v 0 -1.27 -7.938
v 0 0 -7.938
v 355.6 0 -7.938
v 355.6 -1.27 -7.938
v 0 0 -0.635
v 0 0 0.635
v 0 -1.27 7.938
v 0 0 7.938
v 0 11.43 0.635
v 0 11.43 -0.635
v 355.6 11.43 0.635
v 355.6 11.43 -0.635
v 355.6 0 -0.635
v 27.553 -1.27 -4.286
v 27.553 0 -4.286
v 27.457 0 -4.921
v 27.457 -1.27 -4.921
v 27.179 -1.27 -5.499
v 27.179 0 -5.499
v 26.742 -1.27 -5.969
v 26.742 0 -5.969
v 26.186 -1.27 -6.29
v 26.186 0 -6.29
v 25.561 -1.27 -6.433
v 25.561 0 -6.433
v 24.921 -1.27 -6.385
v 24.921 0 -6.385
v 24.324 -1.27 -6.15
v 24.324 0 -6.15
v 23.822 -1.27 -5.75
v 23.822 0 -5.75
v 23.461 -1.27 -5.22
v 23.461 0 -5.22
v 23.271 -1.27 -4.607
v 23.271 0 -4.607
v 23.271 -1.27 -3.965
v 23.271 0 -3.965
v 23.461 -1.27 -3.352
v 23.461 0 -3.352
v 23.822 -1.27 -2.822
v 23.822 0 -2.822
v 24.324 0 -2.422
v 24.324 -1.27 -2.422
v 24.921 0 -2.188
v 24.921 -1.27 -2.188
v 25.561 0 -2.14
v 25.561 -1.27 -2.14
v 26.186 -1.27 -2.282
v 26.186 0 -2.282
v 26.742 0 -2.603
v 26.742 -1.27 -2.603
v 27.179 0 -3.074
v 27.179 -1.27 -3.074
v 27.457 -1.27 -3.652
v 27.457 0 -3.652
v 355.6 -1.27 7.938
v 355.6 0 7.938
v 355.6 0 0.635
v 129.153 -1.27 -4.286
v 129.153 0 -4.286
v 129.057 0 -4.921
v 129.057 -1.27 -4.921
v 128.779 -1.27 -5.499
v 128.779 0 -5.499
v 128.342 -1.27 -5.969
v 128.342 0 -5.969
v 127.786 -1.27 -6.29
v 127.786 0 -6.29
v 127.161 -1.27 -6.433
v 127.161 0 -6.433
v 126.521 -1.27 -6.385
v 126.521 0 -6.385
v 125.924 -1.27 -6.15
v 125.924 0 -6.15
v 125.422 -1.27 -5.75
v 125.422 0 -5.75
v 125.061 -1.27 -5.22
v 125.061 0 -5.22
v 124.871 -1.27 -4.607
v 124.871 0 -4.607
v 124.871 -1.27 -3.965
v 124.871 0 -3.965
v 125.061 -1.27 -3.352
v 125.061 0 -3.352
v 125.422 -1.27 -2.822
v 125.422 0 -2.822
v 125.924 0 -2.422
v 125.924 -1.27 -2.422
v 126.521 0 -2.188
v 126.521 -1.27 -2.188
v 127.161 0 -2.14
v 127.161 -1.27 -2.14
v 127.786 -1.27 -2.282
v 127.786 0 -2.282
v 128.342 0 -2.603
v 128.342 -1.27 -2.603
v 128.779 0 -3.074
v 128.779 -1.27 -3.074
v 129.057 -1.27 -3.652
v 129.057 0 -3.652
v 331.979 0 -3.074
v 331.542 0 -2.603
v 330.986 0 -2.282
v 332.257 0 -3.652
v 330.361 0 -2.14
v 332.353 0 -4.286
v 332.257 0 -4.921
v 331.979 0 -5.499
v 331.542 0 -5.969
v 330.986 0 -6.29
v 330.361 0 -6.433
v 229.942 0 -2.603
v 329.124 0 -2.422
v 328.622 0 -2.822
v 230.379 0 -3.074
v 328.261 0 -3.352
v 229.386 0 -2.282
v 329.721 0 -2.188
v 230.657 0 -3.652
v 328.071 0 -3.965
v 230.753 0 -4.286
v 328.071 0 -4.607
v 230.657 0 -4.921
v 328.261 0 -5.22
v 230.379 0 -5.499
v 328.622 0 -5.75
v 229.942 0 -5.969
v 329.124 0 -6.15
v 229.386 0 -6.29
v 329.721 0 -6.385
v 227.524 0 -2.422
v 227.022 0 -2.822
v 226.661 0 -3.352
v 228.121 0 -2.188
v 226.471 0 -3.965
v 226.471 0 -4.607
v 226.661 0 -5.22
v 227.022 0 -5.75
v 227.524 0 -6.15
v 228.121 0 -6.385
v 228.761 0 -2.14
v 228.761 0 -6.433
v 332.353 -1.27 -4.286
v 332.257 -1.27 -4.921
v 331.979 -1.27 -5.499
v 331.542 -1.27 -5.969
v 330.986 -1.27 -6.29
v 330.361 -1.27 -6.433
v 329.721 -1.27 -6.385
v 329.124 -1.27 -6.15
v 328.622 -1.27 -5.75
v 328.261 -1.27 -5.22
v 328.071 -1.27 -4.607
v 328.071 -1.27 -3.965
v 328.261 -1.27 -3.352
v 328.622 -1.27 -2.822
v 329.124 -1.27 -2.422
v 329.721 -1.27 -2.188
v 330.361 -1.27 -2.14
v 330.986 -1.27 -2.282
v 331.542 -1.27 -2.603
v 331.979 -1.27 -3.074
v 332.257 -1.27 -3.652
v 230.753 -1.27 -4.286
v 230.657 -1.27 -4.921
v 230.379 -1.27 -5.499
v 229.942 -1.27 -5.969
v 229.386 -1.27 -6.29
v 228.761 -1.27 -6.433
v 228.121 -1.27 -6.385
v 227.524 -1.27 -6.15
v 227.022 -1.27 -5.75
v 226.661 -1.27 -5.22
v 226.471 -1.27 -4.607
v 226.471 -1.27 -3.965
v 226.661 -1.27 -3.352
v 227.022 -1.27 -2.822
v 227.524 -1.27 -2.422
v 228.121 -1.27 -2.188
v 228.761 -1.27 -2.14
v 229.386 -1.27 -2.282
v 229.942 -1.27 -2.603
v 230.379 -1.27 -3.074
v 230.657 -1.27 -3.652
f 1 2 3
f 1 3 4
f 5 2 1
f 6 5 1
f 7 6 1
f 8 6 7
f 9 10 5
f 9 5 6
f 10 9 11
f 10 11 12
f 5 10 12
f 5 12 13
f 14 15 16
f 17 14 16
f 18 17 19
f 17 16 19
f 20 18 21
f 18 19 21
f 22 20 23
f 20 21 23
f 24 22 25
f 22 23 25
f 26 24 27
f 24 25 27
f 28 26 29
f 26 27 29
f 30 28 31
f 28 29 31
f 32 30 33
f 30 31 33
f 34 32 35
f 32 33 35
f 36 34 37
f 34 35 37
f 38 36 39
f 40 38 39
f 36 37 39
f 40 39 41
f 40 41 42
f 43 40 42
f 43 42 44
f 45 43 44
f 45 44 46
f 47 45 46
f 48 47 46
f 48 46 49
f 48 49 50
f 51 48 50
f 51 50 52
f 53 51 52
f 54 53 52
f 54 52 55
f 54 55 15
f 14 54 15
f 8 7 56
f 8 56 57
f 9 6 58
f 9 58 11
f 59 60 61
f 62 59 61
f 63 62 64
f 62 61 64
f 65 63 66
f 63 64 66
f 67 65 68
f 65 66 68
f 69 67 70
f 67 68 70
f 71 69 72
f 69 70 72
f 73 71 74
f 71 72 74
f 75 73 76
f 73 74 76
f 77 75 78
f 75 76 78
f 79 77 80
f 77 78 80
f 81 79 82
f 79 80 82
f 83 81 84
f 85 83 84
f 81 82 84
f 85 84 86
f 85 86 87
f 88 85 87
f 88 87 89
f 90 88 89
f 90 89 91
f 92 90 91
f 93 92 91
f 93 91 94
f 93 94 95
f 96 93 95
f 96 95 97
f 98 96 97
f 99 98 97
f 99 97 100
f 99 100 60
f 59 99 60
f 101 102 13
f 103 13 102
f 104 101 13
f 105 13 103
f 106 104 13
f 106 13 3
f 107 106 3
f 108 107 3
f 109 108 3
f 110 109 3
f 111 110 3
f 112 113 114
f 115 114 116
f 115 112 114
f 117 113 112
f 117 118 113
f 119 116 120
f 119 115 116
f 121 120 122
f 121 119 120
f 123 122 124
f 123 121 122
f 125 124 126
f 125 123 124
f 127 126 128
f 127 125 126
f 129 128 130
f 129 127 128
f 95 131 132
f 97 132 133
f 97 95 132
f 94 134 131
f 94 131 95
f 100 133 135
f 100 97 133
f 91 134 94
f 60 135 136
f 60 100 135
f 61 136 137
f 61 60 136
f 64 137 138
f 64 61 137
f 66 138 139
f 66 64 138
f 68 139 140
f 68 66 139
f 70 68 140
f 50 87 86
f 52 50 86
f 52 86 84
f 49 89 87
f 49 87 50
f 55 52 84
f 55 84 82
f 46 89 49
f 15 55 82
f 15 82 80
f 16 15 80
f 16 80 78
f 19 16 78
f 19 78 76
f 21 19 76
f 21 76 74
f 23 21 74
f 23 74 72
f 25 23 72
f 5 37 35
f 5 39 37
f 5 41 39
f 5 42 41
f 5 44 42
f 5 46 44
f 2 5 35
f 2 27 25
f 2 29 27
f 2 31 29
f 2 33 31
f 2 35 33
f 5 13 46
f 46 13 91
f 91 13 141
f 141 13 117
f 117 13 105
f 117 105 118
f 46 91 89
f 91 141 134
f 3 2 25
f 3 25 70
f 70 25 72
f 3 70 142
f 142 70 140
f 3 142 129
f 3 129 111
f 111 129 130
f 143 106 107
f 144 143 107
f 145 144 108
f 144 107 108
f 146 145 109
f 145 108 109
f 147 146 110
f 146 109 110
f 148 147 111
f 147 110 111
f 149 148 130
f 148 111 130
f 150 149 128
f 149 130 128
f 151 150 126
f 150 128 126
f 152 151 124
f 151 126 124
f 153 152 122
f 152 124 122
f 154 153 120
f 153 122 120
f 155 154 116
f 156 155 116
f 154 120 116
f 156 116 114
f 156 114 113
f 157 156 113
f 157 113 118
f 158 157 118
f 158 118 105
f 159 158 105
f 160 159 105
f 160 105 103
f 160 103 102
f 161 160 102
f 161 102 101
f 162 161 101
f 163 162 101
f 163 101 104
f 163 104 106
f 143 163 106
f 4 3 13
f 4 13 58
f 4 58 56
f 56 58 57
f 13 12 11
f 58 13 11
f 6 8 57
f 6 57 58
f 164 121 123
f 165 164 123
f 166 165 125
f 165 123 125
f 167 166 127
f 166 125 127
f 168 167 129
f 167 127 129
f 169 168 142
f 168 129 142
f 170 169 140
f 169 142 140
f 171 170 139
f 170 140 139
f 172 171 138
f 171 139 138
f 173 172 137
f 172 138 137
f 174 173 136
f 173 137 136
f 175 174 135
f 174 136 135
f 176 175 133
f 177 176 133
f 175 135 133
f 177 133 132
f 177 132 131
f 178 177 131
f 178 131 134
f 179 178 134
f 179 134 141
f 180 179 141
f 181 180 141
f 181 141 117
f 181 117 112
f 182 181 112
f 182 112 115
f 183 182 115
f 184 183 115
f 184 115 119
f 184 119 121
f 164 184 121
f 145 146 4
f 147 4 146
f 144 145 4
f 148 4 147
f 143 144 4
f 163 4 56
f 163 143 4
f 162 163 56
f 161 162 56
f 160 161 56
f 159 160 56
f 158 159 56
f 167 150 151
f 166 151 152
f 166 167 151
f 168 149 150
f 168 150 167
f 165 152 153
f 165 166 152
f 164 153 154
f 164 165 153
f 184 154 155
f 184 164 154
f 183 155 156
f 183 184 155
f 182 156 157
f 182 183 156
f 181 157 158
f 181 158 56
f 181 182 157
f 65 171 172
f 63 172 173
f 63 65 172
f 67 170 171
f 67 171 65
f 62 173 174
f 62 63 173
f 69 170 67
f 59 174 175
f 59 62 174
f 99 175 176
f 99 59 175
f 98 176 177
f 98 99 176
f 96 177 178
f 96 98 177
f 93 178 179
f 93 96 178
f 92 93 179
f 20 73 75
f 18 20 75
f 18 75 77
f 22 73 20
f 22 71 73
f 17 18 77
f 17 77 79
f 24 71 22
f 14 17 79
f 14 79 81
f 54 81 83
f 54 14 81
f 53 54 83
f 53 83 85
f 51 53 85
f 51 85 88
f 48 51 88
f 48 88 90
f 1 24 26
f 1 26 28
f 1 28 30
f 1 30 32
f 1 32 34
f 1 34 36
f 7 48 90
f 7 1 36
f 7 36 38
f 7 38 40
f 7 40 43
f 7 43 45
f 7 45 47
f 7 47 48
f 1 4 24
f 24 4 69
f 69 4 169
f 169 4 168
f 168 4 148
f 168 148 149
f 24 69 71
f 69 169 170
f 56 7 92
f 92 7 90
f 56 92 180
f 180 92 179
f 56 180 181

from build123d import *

# Parameters (mm, degrees)
BOSS_EXTRUDE1_DEPTH = 355.6
CUT_EXTRUDE1_REACH  = 3.27
SKETCH2_R           = 2.15265


with BuildPart() as part:
    # Sketch1 → Boss-Extrude1 (new body)
    with BuildSketch(Plane(origin=(0, 0, 0), x_dir=(0, 0, -1), z_dir=(1, 0, 0))):
        Polygon((0.635, 0), (7.9375, 0), (7.9375, -1.27), (-7.9375, -1.27), (-7.9375, 0), (-0.635, 0), (-0.635, 11.43), (0.635, 11.43), align=None)
    extrude(amount=BOSS_EXTRUDE1_DEPTH)

    # Sketch2 → Cut-Extrude1 (cut, up to next)
    with BuildSketch(Plane(origin=(0, 0, 0), x_dir=(1, 0, 0), z_dir=(0, 1, 0)), mode=Mode.PRIVATE) as cut_extrude1_sk1:
        with Locations((25.4, 4.28625)):
            Circle(SKETCH2_R)
    cut_extrude1_tool1 = extrude(cut_extrude1_sk1.sketch, amount=-CUT_EXTRUDE1_REACH, mode=Mode.PRIVATE) & part.part
    add(cut_extrude1_tool1.solids().sort_by_distance((25.4, 0, -4.28625))[0], mode=Mode.SUBTRACT)
    # Sketch2 → Cut-Extrude1 (cut, up to next)
    with BuildSketch(Plane(origin=(0, 0, 0), x_dir=(1, 0, 0), z_dir=(0, 1, 0)), mode=Mode.PRIVATE) as cut_extrude1_sk2:
        with Locations((127, 4.28625)):
            Circle(SKETCH2_R)
    cut_extrude1_tool2 = extrude(cut_extrude1_sk2.sketch, amount=-CUT_EXTRUDE1_REACH, mode=Mode.PRIVATE) & part.part
    add(cut_extrude1_tool2.solids().sort_by_distance((127, 0, -4.28625))[0], mode=Mode.SUBTRACT)
    # Sketch2 → Cut-Extrude1 (cut, up to next)
    with BuildSketch(Plane(origin=(0, 0, 0), x_dir=(1, 0, 0), z_dir=(0, 1, 0)), mode=Mode.PRIVATE) as cut_extrude1_sk3:
        with Locations((228.6, 4.28625)):
            Circle(SKETCH2_R)
    cut_extrude1_tool3 = extrude(cut_extrude1_sk3.sketch, amount=-CUT_EXTRUDE1_REACH, mode=Mode.PRIVATE) & part.part
    add(cut_extrude1_tool3.solids().sort_by_distance((228.6, 0, -4.28625))[0], mode=Mode.SUBTRACT)
    # Sketch2 → Cut-Extrude1 (cut, up to next)
    with BuildSketch(Plane(origin=(0, 0, 0), x_dir=(1, 0, 0), z_dir=(0, 1, 0)), mode=Mode.PRIVATE) as cut_extrude1_sk4:
        with Locations((330.2, 4.28625)):
            Circle(SKETCH2_R)
    cut_extrude1_tool4 = extrude(cut_extrude1_sk4.sketch, amount=-CUT_EXTRUDE1_REACH, mode=Mode.PRIVATE) & part.part
    add(cut_extrude1_tool4.solids().sort_by_distance((330.2, 0, -4.28625))[0], mode=Mode.SUBTRACT)


solid = part.part
